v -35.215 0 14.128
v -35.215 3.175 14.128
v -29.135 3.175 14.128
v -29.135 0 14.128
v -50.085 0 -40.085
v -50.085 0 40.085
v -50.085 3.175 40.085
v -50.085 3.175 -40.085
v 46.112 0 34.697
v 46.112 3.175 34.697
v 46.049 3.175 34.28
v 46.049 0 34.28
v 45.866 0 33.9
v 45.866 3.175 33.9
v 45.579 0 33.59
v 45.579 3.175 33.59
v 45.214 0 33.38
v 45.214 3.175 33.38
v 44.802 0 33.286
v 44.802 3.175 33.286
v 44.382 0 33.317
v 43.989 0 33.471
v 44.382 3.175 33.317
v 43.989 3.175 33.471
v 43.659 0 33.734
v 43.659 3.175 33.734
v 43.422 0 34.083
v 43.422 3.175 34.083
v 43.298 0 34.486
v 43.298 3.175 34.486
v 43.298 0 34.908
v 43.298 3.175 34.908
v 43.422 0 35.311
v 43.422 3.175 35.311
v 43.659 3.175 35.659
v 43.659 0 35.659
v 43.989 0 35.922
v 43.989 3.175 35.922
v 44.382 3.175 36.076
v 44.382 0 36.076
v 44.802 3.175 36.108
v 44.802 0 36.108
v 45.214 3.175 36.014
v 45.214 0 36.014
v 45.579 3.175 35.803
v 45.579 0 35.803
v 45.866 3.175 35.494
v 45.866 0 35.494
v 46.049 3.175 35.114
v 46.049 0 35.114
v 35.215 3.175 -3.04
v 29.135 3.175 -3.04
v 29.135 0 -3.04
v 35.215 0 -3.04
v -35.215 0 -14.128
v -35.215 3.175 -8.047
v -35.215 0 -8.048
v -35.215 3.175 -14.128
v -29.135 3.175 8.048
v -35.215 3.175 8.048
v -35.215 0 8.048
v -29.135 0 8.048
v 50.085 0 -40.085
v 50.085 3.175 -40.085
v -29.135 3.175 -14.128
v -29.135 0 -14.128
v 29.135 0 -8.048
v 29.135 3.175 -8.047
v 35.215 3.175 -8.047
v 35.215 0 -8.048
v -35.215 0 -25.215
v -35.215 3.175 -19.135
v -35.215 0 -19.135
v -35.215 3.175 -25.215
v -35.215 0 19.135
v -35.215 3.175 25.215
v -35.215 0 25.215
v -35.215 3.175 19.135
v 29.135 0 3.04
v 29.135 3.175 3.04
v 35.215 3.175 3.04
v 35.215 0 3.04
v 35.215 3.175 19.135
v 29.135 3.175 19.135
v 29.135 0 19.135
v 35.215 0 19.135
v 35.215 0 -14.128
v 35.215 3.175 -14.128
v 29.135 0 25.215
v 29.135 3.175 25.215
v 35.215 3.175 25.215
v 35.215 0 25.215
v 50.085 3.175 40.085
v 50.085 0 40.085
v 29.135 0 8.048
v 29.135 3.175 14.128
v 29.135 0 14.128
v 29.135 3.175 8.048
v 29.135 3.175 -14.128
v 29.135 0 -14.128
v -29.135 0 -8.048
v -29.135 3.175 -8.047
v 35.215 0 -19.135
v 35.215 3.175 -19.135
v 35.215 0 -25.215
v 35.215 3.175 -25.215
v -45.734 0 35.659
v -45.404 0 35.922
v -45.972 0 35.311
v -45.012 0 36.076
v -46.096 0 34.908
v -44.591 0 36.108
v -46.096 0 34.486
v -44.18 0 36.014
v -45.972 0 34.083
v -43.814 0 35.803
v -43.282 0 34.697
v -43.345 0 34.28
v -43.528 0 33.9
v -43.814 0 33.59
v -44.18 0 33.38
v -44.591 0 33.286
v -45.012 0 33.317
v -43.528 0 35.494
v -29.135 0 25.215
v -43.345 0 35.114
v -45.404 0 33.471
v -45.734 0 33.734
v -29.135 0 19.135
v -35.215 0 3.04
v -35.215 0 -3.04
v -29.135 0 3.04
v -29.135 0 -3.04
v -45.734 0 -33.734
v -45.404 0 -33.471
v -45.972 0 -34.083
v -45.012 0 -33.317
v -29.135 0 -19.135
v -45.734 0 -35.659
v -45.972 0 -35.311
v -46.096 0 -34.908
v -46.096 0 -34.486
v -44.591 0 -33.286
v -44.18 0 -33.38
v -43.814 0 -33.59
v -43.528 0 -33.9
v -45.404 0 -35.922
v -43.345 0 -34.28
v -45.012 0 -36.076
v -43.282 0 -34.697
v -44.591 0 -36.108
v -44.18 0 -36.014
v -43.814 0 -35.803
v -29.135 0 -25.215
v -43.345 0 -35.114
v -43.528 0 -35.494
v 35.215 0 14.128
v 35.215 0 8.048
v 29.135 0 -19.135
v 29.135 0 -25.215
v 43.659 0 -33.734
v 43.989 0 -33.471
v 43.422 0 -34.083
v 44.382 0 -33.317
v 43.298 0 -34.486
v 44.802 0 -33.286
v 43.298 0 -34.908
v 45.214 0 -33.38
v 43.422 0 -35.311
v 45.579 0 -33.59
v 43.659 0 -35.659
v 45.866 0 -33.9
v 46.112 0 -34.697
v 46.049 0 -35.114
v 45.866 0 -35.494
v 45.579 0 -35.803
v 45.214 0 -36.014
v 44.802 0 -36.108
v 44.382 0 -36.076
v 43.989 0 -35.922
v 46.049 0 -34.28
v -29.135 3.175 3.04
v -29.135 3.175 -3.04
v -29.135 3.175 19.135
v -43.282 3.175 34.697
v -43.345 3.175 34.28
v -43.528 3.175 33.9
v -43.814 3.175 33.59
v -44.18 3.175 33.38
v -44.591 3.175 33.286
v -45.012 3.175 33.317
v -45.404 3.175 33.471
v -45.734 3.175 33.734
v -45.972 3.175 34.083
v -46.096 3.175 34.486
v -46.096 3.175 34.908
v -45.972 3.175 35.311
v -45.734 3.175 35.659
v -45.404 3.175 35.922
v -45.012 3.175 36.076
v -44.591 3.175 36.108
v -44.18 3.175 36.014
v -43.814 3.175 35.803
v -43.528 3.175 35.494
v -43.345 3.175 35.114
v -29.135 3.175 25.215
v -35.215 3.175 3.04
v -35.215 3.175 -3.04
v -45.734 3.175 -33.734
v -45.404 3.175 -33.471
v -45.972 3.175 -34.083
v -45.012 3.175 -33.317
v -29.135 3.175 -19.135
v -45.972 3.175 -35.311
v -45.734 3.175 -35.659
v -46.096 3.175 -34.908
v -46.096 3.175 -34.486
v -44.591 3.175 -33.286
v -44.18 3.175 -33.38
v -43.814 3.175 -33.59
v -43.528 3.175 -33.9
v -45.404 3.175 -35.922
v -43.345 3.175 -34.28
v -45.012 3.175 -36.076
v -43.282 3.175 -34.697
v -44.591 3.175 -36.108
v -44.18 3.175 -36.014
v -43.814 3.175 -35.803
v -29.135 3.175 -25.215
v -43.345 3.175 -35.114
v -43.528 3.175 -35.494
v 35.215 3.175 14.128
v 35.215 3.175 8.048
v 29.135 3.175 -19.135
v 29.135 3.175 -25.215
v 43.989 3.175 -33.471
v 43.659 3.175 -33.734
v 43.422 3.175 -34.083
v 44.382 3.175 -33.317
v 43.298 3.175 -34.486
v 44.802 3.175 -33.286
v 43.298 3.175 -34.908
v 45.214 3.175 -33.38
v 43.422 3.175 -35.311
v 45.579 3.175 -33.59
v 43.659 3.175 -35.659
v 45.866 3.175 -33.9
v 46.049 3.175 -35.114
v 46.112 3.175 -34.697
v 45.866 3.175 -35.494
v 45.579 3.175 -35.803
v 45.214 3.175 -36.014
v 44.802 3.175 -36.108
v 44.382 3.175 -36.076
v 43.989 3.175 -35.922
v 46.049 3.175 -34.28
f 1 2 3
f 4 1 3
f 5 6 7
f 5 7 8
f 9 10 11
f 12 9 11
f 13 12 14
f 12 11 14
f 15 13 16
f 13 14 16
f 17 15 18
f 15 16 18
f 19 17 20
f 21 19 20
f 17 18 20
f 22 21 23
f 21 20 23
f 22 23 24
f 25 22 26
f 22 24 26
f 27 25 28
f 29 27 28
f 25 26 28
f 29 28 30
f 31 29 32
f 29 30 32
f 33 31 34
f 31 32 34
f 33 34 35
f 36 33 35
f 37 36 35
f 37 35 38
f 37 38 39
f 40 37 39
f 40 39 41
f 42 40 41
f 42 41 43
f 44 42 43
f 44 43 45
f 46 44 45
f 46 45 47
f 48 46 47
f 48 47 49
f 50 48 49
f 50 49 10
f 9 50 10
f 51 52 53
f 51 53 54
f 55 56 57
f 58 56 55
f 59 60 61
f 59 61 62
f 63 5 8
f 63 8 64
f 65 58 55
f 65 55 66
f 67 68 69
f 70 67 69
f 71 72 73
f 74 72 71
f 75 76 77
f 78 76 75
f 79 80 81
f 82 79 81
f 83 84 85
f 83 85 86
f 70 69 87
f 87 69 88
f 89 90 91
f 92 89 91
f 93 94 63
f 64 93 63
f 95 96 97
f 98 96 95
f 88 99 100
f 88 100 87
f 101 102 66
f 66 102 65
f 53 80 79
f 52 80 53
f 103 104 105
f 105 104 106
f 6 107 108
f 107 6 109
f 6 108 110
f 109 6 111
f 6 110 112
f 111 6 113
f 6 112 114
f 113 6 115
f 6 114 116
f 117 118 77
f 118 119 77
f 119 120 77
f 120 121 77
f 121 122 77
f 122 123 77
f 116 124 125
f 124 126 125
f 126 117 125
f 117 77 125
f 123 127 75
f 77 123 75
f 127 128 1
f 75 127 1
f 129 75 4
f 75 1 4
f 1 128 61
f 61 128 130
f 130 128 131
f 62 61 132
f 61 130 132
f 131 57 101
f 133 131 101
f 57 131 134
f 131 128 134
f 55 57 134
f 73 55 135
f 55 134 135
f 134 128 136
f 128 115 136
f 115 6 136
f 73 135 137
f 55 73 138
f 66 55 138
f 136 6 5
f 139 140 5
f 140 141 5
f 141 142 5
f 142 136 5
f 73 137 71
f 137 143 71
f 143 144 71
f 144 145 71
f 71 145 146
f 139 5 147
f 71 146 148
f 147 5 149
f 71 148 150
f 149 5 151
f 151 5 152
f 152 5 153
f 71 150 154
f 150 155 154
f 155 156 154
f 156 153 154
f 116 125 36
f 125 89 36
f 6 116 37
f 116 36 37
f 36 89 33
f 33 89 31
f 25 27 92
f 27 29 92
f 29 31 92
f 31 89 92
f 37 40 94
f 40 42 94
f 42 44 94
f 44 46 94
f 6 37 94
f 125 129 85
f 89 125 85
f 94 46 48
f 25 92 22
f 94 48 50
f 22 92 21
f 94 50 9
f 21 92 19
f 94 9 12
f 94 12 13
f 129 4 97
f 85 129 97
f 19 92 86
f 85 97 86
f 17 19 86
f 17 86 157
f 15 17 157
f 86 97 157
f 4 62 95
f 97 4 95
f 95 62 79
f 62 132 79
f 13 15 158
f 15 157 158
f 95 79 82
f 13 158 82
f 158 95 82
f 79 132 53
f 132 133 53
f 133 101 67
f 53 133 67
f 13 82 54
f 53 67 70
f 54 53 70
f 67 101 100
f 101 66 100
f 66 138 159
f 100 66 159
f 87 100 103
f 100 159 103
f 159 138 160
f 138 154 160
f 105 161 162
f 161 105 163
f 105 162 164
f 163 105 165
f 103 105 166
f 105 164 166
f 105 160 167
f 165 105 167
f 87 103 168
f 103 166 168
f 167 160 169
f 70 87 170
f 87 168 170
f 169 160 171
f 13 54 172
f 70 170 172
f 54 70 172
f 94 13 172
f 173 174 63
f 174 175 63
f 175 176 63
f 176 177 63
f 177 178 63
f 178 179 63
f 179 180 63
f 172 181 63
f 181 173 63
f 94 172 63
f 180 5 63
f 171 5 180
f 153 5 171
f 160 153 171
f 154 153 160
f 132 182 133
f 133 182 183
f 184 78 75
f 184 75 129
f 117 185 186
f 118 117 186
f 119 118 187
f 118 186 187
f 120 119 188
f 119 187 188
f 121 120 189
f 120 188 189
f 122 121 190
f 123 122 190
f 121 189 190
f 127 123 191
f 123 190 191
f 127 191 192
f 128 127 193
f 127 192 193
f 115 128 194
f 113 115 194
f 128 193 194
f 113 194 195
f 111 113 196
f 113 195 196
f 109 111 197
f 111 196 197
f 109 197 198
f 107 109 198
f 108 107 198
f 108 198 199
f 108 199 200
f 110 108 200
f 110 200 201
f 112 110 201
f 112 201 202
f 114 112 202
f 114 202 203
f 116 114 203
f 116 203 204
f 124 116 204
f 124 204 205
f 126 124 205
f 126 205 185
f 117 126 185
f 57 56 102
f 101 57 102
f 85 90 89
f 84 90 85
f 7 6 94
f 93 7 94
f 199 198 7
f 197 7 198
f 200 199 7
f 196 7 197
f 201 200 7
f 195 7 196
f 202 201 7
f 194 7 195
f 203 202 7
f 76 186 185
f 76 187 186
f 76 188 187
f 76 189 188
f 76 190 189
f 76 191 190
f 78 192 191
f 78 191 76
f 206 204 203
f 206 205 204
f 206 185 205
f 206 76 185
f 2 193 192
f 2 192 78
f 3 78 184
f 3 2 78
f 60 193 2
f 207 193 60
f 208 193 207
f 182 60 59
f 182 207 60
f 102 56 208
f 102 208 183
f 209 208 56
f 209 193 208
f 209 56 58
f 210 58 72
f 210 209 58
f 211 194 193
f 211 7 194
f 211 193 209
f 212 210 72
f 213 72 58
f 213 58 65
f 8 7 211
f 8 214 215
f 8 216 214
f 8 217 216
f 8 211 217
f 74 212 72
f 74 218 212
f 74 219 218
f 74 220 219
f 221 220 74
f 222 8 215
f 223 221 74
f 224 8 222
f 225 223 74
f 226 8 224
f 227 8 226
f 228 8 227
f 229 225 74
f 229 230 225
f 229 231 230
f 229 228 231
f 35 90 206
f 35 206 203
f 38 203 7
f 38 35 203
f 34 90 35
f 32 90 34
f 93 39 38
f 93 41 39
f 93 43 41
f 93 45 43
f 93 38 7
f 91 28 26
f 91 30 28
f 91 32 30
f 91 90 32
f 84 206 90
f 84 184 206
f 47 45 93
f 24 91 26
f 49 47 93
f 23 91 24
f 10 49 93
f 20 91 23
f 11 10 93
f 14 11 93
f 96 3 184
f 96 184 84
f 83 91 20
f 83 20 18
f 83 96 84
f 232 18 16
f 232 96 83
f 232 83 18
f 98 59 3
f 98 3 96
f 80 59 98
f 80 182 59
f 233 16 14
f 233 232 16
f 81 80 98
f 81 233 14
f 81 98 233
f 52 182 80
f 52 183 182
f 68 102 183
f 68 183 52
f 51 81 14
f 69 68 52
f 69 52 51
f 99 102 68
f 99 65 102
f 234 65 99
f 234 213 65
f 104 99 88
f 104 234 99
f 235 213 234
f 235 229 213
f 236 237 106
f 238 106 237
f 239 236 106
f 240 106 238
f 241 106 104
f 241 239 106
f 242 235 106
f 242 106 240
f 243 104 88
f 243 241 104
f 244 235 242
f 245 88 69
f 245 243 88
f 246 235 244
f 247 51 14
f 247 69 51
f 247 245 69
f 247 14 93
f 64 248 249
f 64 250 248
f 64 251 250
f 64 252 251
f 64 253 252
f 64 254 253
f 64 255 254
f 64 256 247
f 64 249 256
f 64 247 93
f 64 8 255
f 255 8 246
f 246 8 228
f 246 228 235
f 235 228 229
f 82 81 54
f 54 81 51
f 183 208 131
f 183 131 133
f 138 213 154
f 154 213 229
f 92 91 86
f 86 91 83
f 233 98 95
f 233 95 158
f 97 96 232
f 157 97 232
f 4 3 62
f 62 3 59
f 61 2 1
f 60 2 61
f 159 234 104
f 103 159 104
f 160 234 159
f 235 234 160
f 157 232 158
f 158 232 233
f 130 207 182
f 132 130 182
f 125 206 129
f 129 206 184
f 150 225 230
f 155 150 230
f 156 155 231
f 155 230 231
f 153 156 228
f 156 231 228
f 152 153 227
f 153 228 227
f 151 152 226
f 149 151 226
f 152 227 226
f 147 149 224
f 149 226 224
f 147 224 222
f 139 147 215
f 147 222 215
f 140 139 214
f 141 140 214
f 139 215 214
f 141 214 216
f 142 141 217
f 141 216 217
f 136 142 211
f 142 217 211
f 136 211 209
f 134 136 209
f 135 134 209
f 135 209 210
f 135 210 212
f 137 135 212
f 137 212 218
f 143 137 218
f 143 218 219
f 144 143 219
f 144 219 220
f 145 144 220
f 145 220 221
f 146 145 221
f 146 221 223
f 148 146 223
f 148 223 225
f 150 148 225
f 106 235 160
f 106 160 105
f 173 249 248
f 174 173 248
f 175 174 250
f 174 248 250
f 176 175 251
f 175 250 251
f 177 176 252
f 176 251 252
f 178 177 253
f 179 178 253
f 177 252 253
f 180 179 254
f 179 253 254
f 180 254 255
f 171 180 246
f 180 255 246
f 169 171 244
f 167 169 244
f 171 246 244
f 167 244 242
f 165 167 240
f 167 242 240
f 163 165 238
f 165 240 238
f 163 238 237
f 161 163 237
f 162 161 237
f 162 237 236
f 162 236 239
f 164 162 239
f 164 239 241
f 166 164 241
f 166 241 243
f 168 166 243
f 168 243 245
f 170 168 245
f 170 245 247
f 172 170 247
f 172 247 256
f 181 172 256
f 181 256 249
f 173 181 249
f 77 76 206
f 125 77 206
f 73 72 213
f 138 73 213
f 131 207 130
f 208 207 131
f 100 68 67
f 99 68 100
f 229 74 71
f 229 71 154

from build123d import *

# Parameters (mm, degrees)
SKETCH1_W           = 100.17
SKETCH1_H           = 80.17
BOSS_EXTRUDE1_DEPTH = 3.175
SKETCH2_W           = 6.08
SKETCH2_H           = 6.08
CUT_EXTRUDE2_DEPTH  = 4.175
LPATTERN1_COUNT     = 5
LPATTERN1_PITCH     = 11.0875
SKETCH4_R           = 1.415
CUT_EXTRUDE3_DEPTH  = 6.35


with BuildPart() as part:
    # Sketch1 → Boss-Extrude1 (new body)
    with BuildSketch(Plane(origin=(0, 0, 0), x_dir=(1, 0, 0), z_dir=(0, 1, 0))):
        Rectangle(SKETCH1_W, SKETCH1_H)
    extrude(amount=BOSS_EXTRUDE1_DEPTH)

    # Sketch2 → Cut-Extrude2 (cut, through all)
    with BuildSketch(Plane(origin=(0, 3.175, 0), x_dir=(1, 0, 0), z_dir=(0, 1, 0))):
        with Locations((-32.175, 22.175)):
            Rectangle(SKETCH2_W, SKETCH2_H)
        with Locations((32.175, 22.175)):
            Rectangle(SKETCH2_W, SKETCH2_H)
    cut_extrude2 = extrude(amount=-CUT_EXTRUDE2_DEPTH, mode=Mode.SUBTRACT)

    # LPattern1: Cut-Extrude2 ×5
    with Locations(*[(0, 0, i * LPATTERN1_PITCH) for i in range(1, LPATTERN1_COUNT)]):
        add(cut_extrude2, mode=Mode.SUBTRACT)

    # Sketch4 → Cut-Extrude3 (cut)
    with BuildSketch(Plane(origin=(0, 3.175, 0), x_dir=(1, 0, 0), z_dir=(0, 1, 0))):
        with Locations((-44.696699141, 34.696699141)):
            Circle(SKETCH4_R)
        with Locations((44.696699141, 34.696699141)):
            Circle(SKETCH4_R)
        with Locations((44.696699141, -34.696699141)):
            Circle(SKETCH4_R)
        with Locations((-44.696699141, -34.696699141)):
            Circle(SKETCH4_R)
    extrude(amount=-CUT_EXTRUDE3_DEPTH, mode=Mode.SUBTRACT)


solid = part.part
